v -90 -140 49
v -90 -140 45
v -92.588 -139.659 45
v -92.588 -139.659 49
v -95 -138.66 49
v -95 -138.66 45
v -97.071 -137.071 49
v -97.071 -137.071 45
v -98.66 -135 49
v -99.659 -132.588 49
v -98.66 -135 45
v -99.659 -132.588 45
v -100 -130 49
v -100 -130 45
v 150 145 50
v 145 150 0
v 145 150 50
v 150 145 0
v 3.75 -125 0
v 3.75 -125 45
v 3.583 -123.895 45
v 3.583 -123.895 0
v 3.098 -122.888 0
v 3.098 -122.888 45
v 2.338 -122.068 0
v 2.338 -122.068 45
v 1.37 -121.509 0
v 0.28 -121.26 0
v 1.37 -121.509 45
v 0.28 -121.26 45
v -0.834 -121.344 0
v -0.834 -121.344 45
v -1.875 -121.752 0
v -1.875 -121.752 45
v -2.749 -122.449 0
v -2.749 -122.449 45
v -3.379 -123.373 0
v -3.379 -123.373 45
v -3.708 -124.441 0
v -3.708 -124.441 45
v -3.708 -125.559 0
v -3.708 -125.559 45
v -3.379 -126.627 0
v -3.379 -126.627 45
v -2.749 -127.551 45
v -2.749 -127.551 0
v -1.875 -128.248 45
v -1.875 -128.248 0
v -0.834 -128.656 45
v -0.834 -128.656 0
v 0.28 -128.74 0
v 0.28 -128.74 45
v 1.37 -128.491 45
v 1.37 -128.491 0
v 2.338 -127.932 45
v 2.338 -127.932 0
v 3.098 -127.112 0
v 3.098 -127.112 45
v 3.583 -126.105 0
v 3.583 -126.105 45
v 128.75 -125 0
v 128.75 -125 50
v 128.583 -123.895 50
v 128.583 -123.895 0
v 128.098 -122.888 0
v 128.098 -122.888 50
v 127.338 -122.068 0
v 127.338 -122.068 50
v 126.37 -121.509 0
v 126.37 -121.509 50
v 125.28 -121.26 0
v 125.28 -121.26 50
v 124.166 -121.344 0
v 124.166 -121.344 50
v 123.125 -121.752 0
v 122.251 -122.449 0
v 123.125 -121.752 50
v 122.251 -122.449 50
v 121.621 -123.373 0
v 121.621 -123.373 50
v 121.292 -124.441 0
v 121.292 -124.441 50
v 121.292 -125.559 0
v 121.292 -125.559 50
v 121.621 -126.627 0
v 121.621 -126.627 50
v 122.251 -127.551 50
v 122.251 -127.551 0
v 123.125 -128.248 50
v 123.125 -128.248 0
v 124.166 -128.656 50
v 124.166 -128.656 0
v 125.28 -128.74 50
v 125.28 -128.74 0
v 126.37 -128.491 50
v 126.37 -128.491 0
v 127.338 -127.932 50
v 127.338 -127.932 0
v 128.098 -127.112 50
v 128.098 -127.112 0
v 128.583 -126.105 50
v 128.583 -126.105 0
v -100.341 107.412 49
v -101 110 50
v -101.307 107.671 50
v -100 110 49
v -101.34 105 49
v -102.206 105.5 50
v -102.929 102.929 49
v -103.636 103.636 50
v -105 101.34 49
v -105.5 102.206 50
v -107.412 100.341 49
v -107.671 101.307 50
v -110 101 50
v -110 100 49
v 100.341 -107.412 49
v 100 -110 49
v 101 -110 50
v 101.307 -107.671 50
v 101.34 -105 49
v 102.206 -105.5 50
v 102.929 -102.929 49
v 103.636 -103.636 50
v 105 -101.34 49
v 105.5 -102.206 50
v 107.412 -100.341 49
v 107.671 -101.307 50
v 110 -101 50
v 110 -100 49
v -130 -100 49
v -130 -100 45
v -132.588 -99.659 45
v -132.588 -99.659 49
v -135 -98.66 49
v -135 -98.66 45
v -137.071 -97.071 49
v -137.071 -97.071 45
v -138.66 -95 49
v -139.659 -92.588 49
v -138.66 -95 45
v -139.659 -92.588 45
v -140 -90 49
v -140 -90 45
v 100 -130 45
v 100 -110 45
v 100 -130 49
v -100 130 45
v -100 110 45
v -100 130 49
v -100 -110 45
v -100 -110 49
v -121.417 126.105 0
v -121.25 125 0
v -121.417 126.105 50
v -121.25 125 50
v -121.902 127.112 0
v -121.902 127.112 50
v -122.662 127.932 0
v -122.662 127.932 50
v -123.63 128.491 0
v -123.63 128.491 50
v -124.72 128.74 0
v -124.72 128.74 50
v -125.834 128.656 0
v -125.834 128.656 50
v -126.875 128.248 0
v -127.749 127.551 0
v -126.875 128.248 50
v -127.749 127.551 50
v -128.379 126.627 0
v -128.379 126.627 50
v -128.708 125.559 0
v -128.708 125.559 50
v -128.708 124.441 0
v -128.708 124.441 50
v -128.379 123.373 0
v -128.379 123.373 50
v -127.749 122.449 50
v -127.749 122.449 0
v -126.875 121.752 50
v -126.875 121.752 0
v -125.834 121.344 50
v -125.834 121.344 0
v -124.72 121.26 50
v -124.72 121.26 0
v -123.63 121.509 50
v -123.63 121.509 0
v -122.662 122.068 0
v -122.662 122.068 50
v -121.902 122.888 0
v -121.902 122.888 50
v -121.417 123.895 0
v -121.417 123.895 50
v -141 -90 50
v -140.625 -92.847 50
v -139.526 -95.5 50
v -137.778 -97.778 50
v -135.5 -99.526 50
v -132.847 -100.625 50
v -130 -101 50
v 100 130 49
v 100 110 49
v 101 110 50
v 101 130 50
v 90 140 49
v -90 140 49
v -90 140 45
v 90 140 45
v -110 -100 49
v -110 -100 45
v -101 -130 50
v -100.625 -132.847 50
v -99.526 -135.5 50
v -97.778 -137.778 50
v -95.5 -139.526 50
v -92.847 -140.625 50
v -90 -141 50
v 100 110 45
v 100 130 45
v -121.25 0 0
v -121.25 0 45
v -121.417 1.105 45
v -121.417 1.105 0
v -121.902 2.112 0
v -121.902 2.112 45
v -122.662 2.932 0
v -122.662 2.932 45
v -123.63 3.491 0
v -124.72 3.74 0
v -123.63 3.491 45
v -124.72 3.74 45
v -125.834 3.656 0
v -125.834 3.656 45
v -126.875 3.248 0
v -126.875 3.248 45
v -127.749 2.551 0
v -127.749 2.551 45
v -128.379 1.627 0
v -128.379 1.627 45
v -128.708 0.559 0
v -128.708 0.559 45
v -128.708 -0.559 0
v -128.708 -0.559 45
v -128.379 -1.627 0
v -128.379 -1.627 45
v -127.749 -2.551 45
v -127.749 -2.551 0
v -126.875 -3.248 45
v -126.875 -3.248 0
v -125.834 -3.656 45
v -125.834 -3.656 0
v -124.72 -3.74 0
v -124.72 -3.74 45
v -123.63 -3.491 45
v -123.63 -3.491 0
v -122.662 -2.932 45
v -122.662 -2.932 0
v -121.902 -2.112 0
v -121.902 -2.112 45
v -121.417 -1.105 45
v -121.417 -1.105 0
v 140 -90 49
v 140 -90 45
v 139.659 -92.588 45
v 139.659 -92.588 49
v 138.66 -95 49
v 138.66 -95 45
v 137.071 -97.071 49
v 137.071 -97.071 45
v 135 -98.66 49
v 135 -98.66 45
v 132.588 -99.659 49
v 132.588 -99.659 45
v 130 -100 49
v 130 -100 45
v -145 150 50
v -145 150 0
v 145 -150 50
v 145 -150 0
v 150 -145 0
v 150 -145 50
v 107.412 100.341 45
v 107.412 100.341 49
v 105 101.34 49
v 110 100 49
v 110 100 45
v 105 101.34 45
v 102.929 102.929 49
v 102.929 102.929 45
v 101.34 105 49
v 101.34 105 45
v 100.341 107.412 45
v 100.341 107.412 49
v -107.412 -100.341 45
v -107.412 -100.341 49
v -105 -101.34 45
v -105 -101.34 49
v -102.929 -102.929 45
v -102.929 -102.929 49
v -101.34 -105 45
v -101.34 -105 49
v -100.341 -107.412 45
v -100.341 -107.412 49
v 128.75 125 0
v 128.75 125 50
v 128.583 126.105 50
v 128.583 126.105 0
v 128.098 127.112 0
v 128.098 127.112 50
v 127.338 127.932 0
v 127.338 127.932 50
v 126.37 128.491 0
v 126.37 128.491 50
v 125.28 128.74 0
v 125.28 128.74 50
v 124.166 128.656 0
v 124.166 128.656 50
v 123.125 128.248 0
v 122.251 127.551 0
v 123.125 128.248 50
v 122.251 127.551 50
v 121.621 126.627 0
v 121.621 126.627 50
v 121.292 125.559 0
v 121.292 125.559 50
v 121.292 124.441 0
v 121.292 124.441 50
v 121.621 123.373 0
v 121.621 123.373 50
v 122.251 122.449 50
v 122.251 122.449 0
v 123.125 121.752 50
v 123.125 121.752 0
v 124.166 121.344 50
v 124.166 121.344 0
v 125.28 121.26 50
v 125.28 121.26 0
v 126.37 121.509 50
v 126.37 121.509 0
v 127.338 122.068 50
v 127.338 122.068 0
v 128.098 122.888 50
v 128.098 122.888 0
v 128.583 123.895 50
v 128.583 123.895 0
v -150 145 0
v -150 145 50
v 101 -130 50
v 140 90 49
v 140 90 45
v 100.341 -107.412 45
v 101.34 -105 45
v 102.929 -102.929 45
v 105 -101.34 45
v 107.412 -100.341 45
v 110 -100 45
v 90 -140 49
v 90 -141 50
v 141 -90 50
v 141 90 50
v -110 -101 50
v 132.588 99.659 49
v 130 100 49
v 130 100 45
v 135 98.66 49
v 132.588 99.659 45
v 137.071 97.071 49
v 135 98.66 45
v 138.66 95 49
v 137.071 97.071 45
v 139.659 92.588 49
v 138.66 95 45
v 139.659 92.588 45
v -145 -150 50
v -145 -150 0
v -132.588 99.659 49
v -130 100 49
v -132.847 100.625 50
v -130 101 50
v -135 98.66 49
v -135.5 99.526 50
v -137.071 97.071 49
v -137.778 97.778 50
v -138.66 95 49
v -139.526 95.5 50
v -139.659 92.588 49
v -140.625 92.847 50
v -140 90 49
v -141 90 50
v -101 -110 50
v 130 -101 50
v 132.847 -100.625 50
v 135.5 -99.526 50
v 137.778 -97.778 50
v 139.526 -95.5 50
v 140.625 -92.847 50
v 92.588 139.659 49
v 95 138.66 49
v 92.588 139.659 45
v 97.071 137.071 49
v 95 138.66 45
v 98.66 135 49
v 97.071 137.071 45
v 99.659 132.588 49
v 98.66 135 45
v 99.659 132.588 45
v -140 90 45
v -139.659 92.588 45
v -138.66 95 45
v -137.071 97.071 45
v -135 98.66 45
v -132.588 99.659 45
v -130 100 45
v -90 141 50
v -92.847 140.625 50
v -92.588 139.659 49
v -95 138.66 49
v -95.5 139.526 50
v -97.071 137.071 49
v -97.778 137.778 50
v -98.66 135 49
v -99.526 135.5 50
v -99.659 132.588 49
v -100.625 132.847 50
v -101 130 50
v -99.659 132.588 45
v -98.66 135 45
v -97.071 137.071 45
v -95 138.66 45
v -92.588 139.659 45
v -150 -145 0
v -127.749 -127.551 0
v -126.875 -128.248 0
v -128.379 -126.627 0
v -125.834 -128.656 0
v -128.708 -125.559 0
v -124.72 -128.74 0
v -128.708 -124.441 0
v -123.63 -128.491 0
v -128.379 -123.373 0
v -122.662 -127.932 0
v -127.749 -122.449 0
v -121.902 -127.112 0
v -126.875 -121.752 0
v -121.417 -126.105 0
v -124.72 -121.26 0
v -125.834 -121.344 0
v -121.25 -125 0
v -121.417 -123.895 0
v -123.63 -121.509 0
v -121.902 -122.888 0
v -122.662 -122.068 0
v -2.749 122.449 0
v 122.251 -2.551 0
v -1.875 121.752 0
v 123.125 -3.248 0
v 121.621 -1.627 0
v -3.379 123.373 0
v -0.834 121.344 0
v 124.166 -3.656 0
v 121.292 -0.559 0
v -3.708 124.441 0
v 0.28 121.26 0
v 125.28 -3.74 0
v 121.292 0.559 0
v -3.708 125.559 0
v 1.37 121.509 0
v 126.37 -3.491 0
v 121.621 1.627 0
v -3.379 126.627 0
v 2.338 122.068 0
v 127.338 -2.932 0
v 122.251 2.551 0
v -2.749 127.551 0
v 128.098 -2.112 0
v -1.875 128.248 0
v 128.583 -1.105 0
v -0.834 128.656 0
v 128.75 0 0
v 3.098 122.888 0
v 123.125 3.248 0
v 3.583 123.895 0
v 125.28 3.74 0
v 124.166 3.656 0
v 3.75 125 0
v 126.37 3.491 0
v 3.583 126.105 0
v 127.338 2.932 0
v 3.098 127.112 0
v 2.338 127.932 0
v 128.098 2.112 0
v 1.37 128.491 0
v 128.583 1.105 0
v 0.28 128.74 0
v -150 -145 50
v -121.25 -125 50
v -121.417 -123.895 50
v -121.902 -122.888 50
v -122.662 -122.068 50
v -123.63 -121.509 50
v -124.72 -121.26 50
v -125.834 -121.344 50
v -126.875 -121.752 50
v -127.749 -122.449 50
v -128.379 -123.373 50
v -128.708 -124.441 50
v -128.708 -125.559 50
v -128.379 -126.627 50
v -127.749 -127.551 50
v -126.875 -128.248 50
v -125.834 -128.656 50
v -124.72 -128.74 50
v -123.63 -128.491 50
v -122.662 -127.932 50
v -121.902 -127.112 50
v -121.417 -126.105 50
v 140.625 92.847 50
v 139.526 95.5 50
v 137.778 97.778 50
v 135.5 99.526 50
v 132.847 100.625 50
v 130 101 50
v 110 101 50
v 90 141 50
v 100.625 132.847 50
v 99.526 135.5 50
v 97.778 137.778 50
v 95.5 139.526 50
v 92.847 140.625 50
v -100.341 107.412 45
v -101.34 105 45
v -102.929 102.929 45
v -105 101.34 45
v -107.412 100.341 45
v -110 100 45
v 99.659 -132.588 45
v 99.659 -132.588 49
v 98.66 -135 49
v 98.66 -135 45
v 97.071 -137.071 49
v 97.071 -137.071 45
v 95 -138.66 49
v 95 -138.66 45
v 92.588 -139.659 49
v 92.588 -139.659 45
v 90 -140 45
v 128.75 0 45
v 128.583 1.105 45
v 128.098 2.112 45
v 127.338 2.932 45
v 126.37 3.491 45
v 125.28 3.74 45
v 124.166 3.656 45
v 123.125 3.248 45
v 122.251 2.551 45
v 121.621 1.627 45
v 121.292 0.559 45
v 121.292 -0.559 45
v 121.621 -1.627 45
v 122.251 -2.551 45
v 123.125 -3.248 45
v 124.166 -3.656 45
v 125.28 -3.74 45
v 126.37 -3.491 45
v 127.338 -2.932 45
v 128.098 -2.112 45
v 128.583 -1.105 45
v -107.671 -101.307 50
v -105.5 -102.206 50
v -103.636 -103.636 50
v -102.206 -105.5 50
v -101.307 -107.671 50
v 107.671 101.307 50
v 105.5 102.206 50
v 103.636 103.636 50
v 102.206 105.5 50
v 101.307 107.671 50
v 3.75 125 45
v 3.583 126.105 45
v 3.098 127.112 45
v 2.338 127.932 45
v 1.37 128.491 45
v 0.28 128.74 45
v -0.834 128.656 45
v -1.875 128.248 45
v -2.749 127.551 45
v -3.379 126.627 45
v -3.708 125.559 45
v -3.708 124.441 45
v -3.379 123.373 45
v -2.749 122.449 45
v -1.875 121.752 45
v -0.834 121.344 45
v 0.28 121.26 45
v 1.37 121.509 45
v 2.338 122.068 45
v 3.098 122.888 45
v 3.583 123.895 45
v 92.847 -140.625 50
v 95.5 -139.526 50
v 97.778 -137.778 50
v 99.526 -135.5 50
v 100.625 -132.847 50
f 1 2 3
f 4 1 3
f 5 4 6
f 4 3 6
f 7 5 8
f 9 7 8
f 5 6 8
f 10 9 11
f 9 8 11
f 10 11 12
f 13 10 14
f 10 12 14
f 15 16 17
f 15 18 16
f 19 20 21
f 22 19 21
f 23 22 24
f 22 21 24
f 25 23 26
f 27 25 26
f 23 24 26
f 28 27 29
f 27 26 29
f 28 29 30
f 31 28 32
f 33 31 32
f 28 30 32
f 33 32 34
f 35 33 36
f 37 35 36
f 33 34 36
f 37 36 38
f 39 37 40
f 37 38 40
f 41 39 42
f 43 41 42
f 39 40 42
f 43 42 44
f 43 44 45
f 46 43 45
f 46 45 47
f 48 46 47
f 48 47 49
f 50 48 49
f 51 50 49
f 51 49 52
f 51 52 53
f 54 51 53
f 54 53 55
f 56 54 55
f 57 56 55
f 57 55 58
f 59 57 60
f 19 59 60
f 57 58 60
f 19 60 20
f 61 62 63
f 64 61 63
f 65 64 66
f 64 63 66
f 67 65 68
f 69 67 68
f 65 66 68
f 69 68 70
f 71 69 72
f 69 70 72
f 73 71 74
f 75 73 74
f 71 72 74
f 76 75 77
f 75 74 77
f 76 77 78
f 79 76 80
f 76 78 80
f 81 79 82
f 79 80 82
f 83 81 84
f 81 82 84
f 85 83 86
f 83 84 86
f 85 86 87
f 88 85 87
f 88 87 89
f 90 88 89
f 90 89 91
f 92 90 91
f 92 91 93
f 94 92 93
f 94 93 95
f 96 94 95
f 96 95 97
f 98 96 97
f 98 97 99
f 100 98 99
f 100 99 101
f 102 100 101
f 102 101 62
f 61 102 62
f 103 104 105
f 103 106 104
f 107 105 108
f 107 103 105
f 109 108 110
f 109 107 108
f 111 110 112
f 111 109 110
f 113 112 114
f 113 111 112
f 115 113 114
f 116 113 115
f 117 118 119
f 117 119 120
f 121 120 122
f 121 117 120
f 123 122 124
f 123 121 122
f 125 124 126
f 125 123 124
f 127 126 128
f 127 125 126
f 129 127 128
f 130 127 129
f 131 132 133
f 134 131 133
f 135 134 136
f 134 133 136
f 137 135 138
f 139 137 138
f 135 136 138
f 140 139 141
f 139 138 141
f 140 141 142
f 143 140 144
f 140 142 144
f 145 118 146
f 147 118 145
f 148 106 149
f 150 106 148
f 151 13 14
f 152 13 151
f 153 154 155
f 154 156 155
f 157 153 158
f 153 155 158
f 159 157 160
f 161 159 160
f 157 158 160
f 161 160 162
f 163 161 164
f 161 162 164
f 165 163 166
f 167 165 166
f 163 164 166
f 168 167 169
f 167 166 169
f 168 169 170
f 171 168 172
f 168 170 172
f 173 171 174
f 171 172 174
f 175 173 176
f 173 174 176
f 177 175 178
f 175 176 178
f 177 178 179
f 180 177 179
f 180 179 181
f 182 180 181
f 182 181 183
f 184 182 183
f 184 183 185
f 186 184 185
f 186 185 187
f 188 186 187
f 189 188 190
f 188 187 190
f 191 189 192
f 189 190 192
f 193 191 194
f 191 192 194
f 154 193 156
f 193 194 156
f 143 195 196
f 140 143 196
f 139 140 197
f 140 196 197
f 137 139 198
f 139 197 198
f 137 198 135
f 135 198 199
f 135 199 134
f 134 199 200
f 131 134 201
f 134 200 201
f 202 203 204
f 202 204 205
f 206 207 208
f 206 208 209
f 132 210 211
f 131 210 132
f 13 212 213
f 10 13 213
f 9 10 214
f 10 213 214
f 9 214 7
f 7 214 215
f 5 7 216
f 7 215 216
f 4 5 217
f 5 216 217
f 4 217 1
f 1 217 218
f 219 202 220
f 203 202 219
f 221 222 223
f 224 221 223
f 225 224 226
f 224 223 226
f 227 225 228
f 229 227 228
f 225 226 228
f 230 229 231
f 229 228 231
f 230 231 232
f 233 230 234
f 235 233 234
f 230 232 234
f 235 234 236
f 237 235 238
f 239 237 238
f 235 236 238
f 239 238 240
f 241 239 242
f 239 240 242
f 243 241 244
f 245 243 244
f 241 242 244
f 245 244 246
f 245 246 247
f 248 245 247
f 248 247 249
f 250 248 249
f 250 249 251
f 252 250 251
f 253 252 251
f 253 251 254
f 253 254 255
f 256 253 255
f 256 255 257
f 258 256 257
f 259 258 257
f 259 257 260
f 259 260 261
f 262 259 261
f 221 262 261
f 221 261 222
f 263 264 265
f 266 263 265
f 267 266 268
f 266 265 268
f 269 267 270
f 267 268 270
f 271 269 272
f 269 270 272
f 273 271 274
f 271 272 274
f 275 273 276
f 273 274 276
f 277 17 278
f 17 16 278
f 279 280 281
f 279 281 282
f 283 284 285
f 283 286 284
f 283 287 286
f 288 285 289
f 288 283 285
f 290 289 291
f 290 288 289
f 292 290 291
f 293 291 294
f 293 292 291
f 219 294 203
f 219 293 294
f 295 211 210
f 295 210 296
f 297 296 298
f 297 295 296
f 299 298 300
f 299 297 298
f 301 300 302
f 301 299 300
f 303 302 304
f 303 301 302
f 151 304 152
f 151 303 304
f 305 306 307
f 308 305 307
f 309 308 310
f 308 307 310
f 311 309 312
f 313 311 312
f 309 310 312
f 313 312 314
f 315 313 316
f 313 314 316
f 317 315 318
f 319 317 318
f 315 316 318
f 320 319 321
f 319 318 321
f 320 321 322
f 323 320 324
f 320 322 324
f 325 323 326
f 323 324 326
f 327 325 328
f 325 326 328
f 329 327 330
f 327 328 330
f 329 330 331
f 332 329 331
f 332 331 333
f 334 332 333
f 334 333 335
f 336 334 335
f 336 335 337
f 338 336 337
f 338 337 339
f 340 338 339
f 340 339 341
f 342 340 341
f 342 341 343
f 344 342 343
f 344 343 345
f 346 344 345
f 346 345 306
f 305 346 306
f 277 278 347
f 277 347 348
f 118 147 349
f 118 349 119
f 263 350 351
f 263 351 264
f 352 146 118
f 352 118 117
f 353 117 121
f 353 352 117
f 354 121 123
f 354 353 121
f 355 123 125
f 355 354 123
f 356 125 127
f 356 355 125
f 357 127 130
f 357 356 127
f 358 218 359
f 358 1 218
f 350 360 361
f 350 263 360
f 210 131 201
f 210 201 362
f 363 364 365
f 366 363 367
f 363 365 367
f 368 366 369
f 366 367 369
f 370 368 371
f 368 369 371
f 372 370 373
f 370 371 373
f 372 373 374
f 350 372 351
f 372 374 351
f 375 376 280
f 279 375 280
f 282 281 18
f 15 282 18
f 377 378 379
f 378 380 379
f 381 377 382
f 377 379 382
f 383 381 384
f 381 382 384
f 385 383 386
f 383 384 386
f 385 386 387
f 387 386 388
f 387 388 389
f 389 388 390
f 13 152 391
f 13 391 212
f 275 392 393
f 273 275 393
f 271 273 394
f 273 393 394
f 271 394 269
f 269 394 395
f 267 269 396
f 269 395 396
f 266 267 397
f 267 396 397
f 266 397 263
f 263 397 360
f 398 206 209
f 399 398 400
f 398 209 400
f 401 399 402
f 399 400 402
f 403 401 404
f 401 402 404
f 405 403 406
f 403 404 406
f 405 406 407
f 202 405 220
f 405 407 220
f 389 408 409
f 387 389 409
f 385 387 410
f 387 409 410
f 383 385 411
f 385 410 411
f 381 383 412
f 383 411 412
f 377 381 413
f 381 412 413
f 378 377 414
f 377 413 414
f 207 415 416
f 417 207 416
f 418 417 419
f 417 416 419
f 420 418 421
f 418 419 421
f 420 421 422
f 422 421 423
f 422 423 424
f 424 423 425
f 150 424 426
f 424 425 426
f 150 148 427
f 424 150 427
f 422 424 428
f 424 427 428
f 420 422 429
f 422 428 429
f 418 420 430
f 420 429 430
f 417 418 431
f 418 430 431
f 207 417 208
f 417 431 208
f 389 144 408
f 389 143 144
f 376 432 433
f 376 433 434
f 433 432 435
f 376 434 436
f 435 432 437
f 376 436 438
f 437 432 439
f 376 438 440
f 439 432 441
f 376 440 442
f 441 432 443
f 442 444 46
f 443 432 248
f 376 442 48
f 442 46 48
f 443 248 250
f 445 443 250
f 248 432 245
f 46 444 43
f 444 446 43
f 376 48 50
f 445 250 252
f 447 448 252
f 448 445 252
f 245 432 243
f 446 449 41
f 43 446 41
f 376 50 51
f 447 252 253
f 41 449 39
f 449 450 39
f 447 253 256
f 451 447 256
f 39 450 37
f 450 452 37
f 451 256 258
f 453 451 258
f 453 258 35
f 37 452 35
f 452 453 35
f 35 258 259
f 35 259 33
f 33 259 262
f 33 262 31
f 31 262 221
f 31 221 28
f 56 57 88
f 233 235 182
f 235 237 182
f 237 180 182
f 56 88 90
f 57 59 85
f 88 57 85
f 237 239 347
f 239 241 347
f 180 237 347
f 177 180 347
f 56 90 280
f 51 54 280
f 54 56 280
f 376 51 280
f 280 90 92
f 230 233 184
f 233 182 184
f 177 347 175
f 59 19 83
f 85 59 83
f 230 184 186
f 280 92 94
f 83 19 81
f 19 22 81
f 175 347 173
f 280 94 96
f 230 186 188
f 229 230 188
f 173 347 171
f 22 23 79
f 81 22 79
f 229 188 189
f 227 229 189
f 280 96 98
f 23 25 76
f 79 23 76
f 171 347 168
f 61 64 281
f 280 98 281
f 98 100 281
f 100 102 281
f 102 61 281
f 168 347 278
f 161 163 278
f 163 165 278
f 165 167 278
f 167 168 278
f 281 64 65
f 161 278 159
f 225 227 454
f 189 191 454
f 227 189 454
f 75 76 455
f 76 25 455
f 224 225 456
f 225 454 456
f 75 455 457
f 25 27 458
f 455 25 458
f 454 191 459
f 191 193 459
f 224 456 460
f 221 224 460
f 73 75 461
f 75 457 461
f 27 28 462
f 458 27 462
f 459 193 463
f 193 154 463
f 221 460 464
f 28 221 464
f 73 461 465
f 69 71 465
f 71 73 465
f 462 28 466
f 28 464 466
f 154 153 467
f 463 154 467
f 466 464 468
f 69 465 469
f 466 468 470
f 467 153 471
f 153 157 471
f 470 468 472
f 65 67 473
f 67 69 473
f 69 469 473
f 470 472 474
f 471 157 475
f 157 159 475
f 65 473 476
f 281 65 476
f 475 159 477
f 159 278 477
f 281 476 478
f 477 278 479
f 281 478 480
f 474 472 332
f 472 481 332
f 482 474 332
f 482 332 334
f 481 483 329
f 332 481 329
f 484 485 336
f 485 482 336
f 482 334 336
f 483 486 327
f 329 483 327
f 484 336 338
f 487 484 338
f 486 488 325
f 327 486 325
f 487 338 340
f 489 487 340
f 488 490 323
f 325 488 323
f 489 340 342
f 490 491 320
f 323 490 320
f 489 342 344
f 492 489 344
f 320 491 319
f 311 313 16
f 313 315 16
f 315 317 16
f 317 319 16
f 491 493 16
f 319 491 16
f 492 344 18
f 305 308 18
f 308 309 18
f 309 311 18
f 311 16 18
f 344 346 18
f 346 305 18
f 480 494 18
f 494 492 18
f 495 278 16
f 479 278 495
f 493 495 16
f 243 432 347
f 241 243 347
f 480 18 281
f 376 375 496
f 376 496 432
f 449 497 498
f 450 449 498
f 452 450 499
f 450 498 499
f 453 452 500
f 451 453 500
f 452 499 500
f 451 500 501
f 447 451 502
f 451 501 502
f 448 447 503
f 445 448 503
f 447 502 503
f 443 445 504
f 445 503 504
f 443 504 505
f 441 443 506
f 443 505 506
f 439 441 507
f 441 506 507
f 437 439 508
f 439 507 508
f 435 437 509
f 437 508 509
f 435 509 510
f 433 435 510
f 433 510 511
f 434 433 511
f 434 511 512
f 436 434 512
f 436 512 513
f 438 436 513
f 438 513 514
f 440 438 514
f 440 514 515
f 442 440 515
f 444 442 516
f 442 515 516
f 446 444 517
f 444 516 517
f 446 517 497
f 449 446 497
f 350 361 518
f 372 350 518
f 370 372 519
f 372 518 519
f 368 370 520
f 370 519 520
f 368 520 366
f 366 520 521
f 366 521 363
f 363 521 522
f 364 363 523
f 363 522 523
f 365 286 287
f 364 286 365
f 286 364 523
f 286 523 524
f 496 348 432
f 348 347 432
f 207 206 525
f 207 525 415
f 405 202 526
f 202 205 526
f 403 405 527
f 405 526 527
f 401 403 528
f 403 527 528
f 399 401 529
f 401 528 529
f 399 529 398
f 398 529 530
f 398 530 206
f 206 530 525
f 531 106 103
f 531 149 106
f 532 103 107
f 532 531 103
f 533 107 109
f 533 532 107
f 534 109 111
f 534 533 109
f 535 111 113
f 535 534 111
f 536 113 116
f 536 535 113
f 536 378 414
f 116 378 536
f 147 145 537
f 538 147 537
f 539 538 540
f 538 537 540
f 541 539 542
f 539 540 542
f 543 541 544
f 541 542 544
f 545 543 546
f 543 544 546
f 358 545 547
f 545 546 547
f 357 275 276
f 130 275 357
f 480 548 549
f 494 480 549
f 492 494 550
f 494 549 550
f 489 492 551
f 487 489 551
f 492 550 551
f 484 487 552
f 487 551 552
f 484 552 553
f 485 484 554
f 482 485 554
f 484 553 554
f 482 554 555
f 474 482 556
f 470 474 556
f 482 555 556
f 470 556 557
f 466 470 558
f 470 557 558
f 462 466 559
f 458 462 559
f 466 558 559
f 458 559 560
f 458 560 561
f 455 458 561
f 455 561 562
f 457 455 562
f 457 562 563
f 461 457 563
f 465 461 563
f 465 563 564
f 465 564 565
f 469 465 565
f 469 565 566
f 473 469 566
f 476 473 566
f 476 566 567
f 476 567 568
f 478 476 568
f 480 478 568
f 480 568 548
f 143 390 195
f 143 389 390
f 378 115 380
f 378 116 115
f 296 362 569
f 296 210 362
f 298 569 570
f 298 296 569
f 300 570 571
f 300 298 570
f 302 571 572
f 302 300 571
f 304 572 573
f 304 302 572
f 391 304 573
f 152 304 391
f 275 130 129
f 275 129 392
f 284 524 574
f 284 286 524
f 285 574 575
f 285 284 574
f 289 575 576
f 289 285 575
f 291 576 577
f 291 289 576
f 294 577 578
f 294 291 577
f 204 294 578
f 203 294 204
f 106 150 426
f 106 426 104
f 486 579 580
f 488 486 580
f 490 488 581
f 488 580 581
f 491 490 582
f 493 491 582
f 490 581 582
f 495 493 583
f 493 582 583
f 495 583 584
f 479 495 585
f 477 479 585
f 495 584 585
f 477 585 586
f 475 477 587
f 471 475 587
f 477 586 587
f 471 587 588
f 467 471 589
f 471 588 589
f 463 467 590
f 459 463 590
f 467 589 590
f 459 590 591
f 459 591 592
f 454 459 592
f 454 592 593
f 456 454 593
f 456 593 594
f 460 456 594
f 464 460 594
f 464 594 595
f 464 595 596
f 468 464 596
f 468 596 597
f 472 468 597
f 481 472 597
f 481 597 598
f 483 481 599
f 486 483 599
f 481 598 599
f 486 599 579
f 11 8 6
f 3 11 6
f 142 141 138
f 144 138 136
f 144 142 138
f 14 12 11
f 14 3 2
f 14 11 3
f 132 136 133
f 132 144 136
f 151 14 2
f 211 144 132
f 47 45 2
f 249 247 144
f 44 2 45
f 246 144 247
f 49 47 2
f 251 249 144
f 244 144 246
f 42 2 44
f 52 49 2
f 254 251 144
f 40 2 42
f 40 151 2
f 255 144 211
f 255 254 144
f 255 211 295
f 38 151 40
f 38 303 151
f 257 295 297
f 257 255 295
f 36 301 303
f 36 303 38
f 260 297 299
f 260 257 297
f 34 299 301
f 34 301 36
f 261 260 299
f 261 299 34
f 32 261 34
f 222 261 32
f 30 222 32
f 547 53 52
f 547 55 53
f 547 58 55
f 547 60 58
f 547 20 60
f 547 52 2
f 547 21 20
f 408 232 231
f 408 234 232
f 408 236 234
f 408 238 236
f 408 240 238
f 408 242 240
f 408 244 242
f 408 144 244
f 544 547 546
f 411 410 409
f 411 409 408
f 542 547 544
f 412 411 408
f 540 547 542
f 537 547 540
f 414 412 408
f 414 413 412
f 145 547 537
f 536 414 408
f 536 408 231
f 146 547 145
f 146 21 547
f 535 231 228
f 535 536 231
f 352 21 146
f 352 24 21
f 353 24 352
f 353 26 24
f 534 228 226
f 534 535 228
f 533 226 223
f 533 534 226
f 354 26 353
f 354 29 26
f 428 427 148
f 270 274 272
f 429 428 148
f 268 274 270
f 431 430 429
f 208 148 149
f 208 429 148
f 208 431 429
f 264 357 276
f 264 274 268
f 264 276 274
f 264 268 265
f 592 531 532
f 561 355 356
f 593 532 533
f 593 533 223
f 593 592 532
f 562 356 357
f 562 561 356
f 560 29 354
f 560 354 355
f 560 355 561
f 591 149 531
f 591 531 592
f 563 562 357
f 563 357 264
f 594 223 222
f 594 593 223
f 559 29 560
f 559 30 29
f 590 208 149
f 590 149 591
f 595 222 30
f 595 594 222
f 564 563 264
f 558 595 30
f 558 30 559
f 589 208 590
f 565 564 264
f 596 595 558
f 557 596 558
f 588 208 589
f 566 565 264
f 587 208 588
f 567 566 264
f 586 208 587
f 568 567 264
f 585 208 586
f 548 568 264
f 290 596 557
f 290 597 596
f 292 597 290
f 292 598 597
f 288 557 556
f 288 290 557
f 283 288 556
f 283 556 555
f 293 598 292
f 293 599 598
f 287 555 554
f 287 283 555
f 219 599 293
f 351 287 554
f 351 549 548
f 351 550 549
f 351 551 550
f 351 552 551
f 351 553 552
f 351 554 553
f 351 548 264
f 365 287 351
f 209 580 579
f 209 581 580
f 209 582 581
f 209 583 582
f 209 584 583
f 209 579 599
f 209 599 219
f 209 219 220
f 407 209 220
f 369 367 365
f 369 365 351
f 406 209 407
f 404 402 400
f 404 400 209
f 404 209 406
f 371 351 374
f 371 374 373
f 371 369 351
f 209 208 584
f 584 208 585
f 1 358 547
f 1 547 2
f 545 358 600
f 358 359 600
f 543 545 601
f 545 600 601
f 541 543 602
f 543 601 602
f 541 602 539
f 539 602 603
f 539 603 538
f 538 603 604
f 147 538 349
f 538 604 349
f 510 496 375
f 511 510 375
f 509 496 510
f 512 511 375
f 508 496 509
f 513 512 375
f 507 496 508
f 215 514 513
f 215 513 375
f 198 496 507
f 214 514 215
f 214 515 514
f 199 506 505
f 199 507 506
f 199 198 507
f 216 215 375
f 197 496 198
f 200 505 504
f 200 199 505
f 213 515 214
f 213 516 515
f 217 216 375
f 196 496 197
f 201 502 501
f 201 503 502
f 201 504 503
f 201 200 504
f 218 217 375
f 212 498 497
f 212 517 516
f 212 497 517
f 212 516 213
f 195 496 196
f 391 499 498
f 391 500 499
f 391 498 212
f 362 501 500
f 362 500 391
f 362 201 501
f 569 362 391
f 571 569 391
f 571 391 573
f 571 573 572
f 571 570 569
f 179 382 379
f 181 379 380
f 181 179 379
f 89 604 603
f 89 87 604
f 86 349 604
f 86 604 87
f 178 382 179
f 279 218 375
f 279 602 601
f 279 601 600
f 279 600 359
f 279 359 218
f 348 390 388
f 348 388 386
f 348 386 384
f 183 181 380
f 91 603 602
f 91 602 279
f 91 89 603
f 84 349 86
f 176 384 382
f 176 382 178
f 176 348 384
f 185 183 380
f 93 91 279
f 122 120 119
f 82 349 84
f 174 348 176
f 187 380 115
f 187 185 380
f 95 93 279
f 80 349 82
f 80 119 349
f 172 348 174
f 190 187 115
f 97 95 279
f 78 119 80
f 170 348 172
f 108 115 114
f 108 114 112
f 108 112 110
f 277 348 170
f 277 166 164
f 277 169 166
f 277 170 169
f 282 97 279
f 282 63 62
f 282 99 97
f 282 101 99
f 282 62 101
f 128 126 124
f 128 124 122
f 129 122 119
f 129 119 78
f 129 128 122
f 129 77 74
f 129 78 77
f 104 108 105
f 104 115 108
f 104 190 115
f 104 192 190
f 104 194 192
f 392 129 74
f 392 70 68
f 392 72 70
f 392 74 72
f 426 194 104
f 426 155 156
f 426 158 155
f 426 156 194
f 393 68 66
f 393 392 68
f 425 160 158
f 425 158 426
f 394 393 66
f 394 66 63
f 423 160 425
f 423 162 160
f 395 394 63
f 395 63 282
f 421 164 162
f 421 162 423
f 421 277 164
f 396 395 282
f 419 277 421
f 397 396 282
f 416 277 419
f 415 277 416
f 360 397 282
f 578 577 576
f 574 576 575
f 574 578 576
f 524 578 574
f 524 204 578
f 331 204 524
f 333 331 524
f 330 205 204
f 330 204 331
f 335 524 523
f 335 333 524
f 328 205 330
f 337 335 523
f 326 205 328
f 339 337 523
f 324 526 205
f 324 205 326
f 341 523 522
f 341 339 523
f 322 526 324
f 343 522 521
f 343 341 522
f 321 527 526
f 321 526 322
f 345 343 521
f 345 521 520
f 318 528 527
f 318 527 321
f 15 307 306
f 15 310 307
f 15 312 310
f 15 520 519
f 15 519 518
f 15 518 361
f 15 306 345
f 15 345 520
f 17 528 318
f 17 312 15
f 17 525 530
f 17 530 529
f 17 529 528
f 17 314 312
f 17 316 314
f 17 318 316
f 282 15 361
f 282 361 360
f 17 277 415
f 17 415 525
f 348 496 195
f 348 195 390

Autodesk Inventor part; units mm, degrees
ref_plane "YZ Plane" through (0, 0, 0) normal (1, 0, 0) x (0, 1, 0)
ref_plane "XZ Plane" through (0, 0, 0) normal (0, 1, 0) x (-1, 0, 0)
ref_plane "XY Plane" through (0, 0, 0) normal (0, 0, 1) x (1, 0, 0)
sketch "Sketch1" plane through (0, 0, 0) normal (0, 0, 1) x (1, 0, 0)
  line L0 (-150, -150) -> (150, -150)
  line L1 (150, -150) -> (150, 150)
  line L2 (150, 150) -> (-150, 150)
  line L3 (-150, 150) -> (-150, -150)
  line L4 (-150, -150) -> (150, 150) construction
  line L5 (150, -150) -> (-150, 150) construction
  point P0 (0, 0)
  dimension "d0" = 300
  dimension "d1" = 300
extrude "Extrusion1" add sketch "Sketch1" along normal blind 50
chamfer "Chamfer1" distance 5 angle 45 4 edges at (150, -150, 25) (150, 150, 25) (-150, 150, 25) (-150, -150, 25)
sketch "Sketch2" plane through (0, 0, 50) normal (0, 0, 1) x (1, 0, 0)
  line L0 (125, 194.8236) -> (125, -186.7434) construction
  line L1 (150, -145) -> (150, 145) construction
  line L2 (185.8456, 125) -> (-170.134, 125) construction
  line L3 (145, 150) -> (-145, 150) construction
  circle A0 centre (125, 125) radius 3.75
  circle A1 centre (125, 0) radius 3.75
  line L4 (-241.3299, 0) -> (257.0415, 0) construction
  line L5 (0, -263.0568) -> (0, 271.137) construction
  circle A2 centre (0, 125) radius 3.75
  circle A3 centre (125, -125) radius 3.75
  circle A4 centre (0, -125) radius 3.75
  line L6 (-150, -145) -> (-150, 145) construction
  circle A5 centre (-125, 125) radius 3.75
  circle A6 centre (-125, 0) radius 3.75
  circle A7 centre (-125, -125) radius 3.75
  point P0 (0, 0)
  point P1 (145, -150)
  point P2 (-125, 194.8236)
  point P3 (-185.8456, 125)
  point P4 (-145, -150)
  dimension "d7" = 25
  dimension "d8" = 125
  dimension "d9" = 25
  dimension "d10" = 7.5
  dimension "d11" = 7.5
  dimension "d12" = 7.5
extrude "Extrusion2" cut sketch "Sketch2" against normal through all
sketch "Sketch3" plane through (0, 0, 50) normal (0, 0, 1) x (1, 0, 0)
  line L0 (-100, 140) -> (100, 140)
  line L1 (100, 140) -> (100, -140)
  line L2 (100, -140) -> (-100, -140)
  line L3 (-100, -140) -> (-100, 140)
  line L4 (-100, 140) -> (100, -140) construction
  line L5 (100, 140) -> (-100, -140) construction
  line L6 (-140, 100) -> (140, 100)
  line L7 (140, 100) -> (140, -100)
  line L8 (140, -100) -> (-140, -100)
  line L9 (-140, -100) -> (-140, 100)
  line L10 (-140, 100) -> (140, -100) construction
  line L11 (140, 100) -> (-140, -100) construction
  line L12 (150, -145) -> (150, 145) projected
  line L13 (145, 150) -> (-145, 150) projected
  line L14 (-145, -150) -> (145, -150) projected
  point P0 (0, 0)
  point P1 (100, 100)
  point P2 (-100, 100)
  point P3 (-100, -100)
  point P4 (100, -100)
  dimension "d15" = 10
  dimension "d16" = 10
  dimension "d17" = 50
  dimension "d18" = 50
extrude "Extrusion3" cut sketch "Sketch3" against normal blind 5
fillet "Fillet1" radius 10 12 edges at (-100, 100, 47.5) (-100, -100, 47.5) (100, -100, 47.5) (100, 100, 47.5) (140, 100, 47.5) (140, -100, 47.5) (100, -140, 47.5) (-100, -140, 47.5) (-140, -100, 47.5) (-140, 100, 47.5) (-100, 140, 47.5) (100, 140, 47.5)
chamfer "Chamfer2" distance 1 angle 45 24 edges at (100, 120, 50) (102.9289, 102.9289, 50) (120, 100, 50) (137.0711, 97.0711, 50) (140, 0, 50) (137.0711, -97.0711, 50) (120, -100, 50) (102.9289, -102.9289, 50) (100, -120, 50) (97.0711, -137.0711, 50) (0, -140, 50) (-97.0711, -137.0711, 50) (-100, -120, 50) (-102.9289, -102.9289, 50) (-120, -100, 50) (-137.0711, -97.0711, 50) (-140, 0, 50) (-137.0711, 97.0711, 50) (-120, 100, 50) (-102.9289, 102.9289, 50) (-100, 120, 50) (-97.0711, 137.0711, 50) (0, 140, 50) (97.0711, 137.0711, 50)
equation "\"d1\" = d0"
equation "\"d9\" = d7"
equation "\"d11\" = d10"
equation "\"d12\" = d10"
equation "\"d18\" = d17"
properties part number "MDF_Block"
